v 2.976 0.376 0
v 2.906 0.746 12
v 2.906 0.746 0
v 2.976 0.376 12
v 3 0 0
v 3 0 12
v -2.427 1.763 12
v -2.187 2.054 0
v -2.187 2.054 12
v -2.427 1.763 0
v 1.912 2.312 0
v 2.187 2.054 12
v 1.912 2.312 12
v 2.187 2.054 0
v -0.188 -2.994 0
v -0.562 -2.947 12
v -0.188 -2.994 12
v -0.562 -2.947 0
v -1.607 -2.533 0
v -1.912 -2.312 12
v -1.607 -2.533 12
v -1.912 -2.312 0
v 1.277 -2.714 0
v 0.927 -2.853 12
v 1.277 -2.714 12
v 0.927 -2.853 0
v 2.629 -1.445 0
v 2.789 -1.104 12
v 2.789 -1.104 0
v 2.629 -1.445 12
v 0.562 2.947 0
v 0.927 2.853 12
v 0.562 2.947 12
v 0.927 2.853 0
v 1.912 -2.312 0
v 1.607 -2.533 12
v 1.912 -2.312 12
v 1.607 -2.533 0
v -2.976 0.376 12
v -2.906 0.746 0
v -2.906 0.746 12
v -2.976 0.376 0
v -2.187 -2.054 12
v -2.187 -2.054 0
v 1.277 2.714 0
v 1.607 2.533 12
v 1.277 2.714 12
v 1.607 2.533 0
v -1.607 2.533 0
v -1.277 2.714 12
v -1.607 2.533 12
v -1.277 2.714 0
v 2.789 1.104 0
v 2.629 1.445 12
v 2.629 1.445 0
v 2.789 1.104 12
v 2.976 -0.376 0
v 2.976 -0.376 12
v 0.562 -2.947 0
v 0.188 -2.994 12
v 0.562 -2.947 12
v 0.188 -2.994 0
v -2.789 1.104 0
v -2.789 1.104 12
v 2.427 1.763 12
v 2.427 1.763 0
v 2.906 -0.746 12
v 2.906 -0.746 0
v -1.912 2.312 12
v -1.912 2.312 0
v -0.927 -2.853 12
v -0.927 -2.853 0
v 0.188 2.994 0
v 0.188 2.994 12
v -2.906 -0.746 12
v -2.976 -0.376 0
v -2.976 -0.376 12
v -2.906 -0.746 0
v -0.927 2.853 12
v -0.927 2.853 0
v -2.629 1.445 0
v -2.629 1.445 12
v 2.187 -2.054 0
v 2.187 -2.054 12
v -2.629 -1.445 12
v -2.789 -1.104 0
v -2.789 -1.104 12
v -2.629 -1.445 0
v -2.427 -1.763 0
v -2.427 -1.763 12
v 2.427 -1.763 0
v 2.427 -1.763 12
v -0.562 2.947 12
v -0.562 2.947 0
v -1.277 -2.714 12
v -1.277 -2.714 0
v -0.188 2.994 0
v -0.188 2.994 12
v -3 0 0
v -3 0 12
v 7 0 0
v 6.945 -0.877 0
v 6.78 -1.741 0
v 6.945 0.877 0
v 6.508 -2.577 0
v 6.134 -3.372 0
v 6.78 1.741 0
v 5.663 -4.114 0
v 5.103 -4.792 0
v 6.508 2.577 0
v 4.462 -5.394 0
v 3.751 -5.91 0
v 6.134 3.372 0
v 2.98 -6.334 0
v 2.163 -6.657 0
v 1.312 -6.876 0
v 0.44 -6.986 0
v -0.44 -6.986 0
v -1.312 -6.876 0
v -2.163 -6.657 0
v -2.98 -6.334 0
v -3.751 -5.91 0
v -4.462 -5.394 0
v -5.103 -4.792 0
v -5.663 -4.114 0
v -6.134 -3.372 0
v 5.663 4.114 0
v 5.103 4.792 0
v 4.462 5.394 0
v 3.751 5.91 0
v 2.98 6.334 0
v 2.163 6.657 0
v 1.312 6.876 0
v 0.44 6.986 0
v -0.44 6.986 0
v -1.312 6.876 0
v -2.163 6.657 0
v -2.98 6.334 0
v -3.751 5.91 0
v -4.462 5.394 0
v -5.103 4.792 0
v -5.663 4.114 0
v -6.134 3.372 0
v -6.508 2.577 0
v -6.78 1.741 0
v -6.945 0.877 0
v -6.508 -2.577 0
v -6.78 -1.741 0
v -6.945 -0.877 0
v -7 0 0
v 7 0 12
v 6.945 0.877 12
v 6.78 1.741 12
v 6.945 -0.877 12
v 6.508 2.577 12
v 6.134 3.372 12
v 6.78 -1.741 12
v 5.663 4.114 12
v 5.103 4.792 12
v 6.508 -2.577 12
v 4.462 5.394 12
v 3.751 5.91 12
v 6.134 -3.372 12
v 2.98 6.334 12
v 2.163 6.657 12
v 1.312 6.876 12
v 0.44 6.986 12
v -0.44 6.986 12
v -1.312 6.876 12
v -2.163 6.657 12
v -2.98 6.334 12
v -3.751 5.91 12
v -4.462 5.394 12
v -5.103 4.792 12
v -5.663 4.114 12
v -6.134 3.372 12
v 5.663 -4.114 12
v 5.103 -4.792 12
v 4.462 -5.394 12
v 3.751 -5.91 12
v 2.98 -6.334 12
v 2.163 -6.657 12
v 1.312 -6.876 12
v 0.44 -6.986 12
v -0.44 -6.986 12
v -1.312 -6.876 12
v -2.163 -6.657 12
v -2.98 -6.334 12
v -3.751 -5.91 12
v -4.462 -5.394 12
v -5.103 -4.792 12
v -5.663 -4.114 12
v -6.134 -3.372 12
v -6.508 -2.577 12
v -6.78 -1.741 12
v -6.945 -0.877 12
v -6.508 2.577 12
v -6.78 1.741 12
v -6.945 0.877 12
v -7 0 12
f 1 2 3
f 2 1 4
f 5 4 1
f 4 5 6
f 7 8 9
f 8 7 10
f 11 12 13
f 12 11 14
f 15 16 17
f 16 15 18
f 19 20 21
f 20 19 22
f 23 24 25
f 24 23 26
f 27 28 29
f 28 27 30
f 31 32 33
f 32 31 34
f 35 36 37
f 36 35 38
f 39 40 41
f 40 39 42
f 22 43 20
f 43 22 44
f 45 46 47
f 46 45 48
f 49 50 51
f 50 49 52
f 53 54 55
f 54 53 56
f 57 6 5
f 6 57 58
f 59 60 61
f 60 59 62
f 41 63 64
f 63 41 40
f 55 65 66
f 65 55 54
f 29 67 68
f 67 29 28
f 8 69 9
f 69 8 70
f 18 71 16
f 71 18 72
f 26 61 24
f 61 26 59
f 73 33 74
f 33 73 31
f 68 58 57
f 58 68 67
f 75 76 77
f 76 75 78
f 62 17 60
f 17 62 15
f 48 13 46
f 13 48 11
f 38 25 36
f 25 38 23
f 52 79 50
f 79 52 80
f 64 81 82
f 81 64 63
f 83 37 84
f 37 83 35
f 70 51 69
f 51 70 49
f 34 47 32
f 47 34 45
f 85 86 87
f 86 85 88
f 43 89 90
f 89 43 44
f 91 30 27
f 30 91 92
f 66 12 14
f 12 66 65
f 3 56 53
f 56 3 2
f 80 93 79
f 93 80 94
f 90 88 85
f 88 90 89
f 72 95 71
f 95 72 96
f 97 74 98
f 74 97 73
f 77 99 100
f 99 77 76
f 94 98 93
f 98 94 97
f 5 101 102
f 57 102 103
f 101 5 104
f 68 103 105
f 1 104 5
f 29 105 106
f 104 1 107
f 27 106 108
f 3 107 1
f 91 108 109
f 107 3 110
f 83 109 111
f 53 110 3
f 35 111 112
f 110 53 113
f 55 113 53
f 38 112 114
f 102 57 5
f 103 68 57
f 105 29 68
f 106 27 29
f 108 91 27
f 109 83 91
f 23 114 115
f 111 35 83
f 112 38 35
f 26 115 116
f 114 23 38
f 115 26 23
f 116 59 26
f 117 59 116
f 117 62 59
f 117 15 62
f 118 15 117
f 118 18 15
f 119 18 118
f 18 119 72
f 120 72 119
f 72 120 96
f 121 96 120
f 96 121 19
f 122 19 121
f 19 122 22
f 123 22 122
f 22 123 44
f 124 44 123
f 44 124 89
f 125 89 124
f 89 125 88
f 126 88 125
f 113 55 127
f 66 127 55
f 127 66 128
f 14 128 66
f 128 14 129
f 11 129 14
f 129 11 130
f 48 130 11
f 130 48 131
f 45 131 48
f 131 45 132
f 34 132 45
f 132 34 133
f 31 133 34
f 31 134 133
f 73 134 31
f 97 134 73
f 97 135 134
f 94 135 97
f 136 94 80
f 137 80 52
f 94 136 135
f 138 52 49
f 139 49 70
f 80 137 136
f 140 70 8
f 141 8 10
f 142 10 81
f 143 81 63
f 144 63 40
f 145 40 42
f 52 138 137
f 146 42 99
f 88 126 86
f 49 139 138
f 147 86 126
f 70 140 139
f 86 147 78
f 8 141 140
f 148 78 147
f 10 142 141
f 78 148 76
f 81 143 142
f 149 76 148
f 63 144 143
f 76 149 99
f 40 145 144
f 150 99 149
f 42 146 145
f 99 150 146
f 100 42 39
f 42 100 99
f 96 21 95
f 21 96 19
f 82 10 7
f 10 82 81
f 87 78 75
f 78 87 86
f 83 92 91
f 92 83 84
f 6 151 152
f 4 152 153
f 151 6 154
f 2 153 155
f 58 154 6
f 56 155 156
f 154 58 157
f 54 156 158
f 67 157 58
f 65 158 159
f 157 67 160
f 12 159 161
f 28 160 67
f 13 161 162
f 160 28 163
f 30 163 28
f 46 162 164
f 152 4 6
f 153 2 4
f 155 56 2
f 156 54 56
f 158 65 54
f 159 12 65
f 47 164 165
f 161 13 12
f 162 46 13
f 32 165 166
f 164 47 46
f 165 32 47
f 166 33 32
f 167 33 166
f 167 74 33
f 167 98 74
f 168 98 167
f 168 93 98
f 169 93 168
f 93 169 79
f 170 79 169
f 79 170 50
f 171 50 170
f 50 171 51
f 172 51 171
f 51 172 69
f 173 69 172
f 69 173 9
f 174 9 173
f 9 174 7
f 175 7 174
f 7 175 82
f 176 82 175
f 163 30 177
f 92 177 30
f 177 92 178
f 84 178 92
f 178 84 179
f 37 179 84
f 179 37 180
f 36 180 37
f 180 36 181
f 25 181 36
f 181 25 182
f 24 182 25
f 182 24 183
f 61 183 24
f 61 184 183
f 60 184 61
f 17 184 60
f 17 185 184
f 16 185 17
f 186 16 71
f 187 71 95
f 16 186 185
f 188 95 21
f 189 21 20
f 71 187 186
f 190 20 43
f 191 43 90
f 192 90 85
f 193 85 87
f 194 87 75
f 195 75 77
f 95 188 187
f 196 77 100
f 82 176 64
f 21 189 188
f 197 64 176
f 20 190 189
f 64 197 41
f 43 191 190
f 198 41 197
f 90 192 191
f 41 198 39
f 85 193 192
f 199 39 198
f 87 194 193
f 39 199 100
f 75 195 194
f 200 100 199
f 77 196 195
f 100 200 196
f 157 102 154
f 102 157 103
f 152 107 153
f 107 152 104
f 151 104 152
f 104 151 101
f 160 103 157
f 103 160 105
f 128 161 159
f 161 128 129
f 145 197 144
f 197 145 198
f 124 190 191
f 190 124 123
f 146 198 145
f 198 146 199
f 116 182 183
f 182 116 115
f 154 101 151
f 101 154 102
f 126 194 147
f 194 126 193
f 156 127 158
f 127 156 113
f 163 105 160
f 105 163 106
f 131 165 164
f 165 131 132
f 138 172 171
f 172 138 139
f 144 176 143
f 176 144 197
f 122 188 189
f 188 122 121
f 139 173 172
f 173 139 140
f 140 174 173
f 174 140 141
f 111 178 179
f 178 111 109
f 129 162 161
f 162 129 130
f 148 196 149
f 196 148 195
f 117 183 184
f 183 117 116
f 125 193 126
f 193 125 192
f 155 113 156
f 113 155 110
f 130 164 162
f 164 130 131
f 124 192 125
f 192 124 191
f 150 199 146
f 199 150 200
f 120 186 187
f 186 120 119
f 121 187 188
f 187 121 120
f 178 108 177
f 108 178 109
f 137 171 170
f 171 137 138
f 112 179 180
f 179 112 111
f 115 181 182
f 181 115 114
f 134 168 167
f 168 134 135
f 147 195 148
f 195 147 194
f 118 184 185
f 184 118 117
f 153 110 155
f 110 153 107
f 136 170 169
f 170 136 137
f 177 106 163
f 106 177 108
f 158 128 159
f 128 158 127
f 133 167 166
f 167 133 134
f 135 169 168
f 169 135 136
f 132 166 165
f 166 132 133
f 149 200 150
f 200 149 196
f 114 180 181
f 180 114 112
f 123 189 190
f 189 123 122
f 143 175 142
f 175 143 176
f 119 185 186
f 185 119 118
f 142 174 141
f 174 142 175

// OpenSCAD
$fn = 50;

difference() {
	union() {
		cylinder(h = 12, r = 7.0);
	}
	union() {
		cylinder(h = 12, r = 3.0);
		cylinder(h = 12, r = 1.5);
	}
}
